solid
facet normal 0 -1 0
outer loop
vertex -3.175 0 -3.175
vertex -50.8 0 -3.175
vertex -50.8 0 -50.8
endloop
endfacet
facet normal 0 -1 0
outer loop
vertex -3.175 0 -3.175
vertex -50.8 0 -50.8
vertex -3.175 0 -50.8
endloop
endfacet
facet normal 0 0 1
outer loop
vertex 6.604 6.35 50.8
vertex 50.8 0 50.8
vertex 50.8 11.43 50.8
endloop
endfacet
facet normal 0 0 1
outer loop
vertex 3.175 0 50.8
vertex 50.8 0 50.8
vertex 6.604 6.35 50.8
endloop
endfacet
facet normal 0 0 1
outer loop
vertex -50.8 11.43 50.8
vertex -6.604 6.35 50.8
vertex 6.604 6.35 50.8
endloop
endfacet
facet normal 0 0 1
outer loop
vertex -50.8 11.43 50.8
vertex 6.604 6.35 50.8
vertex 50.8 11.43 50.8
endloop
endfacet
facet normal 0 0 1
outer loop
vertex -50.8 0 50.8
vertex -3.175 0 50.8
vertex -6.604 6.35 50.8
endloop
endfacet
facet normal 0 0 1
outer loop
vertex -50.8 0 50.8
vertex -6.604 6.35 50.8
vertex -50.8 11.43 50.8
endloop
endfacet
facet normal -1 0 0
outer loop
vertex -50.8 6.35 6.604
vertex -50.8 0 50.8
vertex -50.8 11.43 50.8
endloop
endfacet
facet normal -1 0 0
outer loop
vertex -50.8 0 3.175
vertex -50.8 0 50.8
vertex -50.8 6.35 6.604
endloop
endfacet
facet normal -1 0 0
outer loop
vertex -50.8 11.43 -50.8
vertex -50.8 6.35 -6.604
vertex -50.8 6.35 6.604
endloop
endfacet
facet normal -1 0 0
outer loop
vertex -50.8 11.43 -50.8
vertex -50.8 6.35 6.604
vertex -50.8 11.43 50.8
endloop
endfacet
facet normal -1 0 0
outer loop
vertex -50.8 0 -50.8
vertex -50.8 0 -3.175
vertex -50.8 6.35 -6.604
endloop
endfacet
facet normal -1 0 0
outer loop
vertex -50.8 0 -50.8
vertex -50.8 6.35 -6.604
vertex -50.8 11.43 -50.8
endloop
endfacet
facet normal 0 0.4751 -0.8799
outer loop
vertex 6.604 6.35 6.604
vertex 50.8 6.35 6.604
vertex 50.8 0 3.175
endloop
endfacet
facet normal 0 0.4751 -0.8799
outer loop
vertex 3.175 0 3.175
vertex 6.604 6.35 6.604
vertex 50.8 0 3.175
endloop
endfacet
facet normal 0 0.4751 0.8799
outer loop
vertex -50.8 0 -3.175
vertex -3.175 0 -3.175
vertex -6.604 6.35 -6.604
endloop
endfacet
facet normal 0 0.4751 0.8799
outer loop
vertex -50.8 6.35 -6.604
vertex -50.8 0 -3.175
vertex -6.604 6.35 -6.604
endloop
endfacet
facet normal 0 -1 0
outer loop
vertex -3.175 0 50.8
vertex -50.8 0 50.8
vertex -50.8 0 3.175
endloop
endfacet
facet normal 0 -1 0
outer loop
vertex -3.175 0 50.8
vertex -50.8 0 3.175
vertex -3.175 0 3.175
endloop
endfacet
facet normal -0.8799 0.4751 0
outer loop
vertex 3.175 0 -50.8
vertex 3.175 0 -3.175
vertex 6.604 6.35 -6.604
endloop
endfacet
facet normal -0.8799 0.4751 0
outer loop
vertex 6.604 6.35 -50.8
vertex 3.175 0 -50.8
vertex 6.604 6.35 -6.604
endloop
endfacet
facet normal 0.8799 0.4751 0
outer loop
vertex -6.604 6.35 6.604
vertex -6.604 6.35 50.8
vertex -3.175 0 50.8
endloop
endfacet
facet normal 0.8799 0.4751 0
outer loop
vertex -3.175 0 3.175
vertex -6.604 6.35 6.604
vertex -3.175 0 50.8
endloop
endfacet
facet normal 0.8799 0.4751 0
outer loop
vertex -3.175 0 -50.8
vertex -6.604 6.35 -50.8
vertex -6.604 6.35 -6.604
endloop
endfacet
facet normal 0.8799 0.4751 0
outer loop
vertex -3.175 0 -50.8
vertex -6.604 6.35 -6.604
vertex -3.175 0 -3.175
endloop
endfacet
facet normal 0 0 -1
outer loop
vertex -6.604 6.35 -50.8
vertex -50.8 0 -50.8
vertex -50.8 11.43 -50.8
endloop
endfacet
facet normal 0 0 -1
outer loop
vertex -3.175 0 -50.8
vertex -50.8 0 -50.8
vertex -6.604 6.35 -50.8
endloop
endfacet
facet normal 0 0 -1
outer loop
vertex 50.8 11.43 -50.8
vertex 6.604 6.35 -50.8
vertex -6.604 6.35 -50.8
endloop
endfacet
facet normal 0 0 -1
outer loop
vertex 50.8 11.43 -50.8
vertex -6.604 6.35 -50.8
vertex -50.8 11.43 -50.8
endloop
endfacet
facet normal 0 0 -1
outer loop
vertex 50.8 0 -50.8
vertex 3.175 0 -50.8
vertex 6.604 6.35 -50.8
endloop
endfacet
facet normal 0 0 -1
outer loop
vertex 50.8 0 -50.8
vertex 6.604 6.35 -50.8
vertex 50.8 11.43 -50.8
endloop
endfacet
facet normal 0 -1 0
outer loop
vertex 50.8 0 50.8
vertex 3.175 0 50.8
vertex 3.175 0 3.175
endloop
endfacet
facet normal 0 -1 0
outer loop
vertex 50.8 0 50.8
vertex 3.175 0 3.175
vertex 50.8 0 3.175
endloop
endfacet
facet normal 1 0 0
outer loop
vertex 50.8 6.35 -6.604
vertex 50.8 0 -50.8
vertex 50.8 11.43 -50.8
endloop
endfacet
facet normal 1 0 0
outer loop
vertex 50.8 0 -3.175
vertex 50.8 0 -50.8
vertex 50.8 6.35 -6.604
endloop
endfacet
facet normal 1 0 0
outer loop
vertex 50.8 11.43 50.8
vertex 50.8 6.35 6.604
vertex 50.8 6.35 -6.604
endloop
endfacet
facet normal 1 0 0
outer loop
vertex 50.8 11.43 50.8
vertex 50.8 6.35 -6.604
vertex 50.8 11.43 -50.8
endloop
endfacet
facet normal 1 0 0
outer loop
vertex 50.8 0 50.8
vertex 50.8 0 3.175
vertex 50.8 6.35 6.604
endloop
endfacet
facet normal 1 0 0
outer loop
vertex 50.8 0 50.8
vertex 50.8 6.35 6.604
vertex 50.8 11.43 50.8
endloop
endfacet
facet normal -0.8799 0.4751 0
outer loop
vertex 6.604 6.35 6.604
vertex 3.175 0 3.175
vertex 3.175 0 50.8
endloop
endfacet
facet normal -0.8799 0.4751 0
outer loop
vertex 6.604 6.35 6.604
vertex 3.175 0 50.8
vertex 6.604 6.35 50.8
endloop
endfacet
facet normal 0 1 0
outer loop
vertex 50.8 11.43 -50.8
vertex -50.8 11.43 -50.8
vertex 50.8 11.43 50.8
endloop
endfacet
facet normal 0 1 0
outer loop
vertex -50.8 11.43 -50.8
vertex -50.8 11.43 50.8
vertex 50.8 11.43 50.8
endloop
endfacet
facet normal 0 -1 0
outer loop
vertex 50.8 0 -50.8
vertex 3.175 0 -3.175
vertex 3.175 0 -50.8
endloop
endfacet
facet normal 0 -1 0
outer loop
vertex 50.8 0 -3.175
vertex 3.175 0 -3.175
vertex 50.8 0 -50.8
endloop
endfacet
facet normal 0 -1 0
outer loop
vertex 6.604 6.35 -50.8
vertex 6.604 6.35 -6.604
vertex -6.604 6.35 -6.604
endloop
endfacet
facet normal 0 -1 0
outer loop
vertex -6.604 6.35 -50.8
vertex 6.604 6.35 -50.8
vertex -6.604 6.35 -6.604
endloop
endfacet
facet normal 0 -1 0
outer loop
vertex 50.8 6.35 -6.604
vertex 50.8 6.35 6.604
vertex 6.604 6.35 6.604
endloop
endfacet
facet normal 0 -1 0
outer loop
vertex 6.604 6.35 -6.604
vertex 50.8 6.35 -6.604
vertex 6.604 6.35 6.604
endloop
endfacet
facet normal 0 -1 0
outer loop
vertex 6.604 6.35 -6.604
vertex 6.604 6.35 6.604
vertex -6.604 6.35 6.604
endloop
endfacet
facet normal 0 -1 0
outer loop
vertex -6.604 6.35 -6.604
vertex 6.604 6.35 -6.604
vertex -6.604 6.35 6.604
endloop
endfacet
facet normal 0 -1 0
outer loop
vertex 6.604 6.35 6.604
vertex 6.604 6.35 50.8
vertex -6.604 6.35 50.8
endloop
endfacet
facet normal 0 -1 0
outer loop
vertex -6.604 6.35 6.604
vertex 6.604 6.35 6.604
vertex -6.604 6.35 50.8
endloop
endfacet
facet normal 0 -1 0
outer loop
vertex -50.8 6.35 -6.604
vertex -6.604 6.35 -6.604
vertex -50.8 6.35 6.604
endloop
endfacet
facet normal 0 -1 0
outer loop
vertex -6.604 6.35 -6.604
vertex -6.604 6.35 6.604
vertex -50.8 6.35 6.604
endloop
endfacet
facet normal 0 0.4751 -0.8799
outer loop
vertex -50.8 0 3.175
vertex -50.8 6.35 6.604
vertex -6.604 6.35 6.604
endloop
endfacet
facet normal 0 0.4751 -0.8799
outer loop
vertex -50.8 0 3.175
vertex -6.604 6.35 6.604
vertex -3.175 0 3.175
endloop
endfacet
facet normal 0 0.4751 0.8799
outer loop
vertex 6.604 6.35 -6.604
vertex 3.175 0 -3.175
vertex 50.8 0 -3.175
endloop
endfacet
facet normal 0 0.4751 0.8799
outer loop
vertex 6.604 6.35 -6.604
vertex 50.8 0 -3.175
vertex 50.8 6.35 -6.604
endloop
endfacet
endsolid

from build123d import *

# Parameters (mm, degrees)
F0_W     = 6.35
F0_H     = 6.35
F3_DEPTH = 11.43
F4_DEPTH = 50.8
F5_DEPTH = 50.8


with BuildPart() as f3:
    # F0 (on Front) → F3 (new body)
    with BuildSketch(Plane.XZ):
        with BuildLine():
            ThreePointArc((50.700684167, 3.175), (50.7751649711, 1.5882764743), (50.8, 0))
            Line((50.8, 0), (50.8, 3.175))
            Line((50.8, 3.175), (50.700684167, 3.175))
        make_face()
        with BuildLine():
            ThreePointArc((-1.86e-08, 50.8), (1.588276465, 50.7751649714), (3.175, 50.700684167))
            Line((3.175, 50.700684167), (3.175, 50.8))
            Line((3.175, 50.8), (-1.86e-08, 50.8))
        make_face()
        with BuildLine():
            ThreePointArc((-3.175, 50.700684167), (-1.5882764835, 50.7751649708), (-1.86e-08, 50.8))
            Line((-1.86e-08, 50.8), (-3.175, 50.8))
            Line((-3.175, 50.8), (-3.175, 50.700684167))
        make_face()
        with BuildLine():
            ThreePointArc((-50.8, -4.94e-08), (-50.7751649719, 1.5882764495), (-50.700684167, 3.175))
            Line((-50.700684167, 3.175), (-50.8, 3.175))
            Line((-50.8, 3.175), (-50.8, -4.94e-08))
        make_face()
        with BuildLine():
            Line((-50.8, -3.175), (-50.700684167, -3.175))
            ThreePointArc((-50.700684167, -3.175), (-50.7751649703, -1.588276499), (-50.8, -4.94e-08))
            Line((-50.8, -4.94e-08), (-50.8, -3.175))
        make_face()
        with BuildLine():
            Line((-3.175, -50.8), (-5.98e-08, -50.8))
            ThreePointArc((-5.98e-08, -50.8), (-1.5882765041, -50.7751649702), (-3.175, -50.700684167))
            Line((-3.175, -50.700684167), (-3.175, -50.8))
        make_face()
        with BuildLine():
            Line((3.175, -50.8), (3.175, -50.700684167))
            ThreePointArc((3.175, -50.700684167), (1.5882764444, -50.775164972), (-5.98e-08, -50.8))
            Line((-5.98e-08, -50.8), (3.175, -50.8))
        make_face()
        with BuildLine():
            Line((50.8, -3.175), (50.8, 0))
            ThreePointArc((50.8, 0), (50.7751649711, -1.5882764743), (50.700684167, -3.175))
            Line((50.700684167, -3.175), (50.8, -3.175))
        make_face()
        with BuildLine():
            ThreePointArc((3.175, 50.700684167), (35.9210244843, 35.9210244843), (50.700684167, 3.175))
            Line((50.700684167, 3.175), (50.8, 3.175))
            Line((50.8, 3.175), (50.8, 50.8))
            Line((50.8, 50.8), (3.175, 50.8))
            Line((3.175, 50.8), (3.175, 50.700684167))
        make_face()
        with BuildLine():
            ThreePointArc((-50.700684167, 3.175), (-35.9210244843, 35.9210244843), (-3.175, 50.700684167))
            Line((-3.175, 50.700684167), (-3.175, 50.8))
            Line((-3.175, 50.8), (-50.8, 50.8))
            Line((-50.8, 50.8), (-50.8, 3.175))
            Line((-50.8, 3.175), (-50.700684167, 3.175))
        make_face()
        with BuildLine():
            Line((-3.175, -50.8), (-3.175, -50.700684167))
            ThreePointArc((-3.175, -50.700684167), (-35.9210244843, -35.9210244843), (-50.700684167, -3.175))
            Line((-50.700684167, -3.175), (-50.8, -3.175))
            Line((-50.8, -3.175), (-50.8, -50.8))
            Line((-50.8, -50.8), (-3.175, -50.8))
        make_face()
        with BuildLine():
            Line((50.8, -3.175), (50.700684167, -3.175))
            ThreePointArc((50.700684167, -3.175), (35.9210244843, -35.9210244843), (3.175, -50.700684167))
            Line((3.175, -50.700684167), (3.175, -50.8))
            Line((3.175, -50.8), (50.8, -50.8))
            Line((50.8, -50.8), (50.8, -3.175))
        make_face()
        with BuildLine():
            ThreePointArc((50.700684167, -3.175), (50.7751649711, -1.5882764743), (50.8, 0))
            ThreePointArc((50.8, 0), (50.7751649711, 1.5882764743), (50.700684167, 3.175))
            Line((50.700684167, 3.175), (3.175, 3.175))
            Line((3.175, 3.175), (3.175, -3.175))
            Line((3.175, -3.175), (50.700684167, -3.175))
        make_face()
        with BuildLine():
            Line((3.175, 3.175), (3.175, 50.700684167))
            ThreePointArc((3.175, 50.700684167), (1.588276465, 50.7751649714), (-1.86e-08, 50.8))
            ThreePointArc((-1.86e-08, 50.8), (-1.5882764835, 50.7751649708), (-3.175, 50.700684167))
            Line((-3.175, 50.700684167), (-3.175, 3.175))
            Line((-3.175, 3.175), (3.175, 3.175))
        make_face()
        with BuildLine():
            Line((-3.175, -3.175), (-3.175, 3.175))
            Line((-3.175, 3.175), (-50.700684167, 3.175))
            ThreePointArc((-50.700684167, 3.175), (-50.7751649719, 1.5882764495), (-50.8, -4.94e-08))
            ThreePointArc((-50.8, -4.94e-08), (-50.7751649703, -1.588276499), (-50.700684167, -3.175))
            Line((-50.700684167, -3.175), (-3.175, -3.175))
        make_face()
        with BuildLine():
            ThreePointArc((-5.98e-08, -50.8), (1.5882764444, -50.775164972), (3.175, -50.700684167))
            Line((3.175, -50.700684167), (3.175, -3.175))
            Line((3.175, -3.175), (-3.175, -3.175))
            Line((-3.175, -3.175), (-3.175, -50.700684167))
            ThreePointArc((-3.175, -50.700684167), (-1.5882765041, -50.7751649702), (-5.98e-08, -50.8))
        make_face()
        with BuildLine():
            Line((3.175, 3.175), (50.700684167, 3.175))
            ThreePointArc((50.700684167, 3.175), (35.9210244843, 35.9210244843), (3.175, 50.700684167))
            Line((3.175, 50.700684167), (3.175, 3.175))
        make_face()
        with BuildLine():
            Line((-50.700684167, 3.175), (-3.175, 3.175))
            Line((-3.175, 3.175), (-3.175, 50.700684167))
            ThreePointArc((-3.175, 50.700684167), (-35.9210244843, 35.9210244843), (-50.700684167, 3.175))
        make_face()
        with BuildLine():
            ThreePointArc((3.175, -50.700684167), (35.9210244843, -35.9210244843), (50.700684167, -3.175))
            Line((50.700684167, -3.175), (3.175, -3.175))
            Line((3.175, -3.175), (3.175, -50.700684167))
        make_face()
        with BuildLine():
            Line((-3.175, -50.700684167), (-3.175, -3.175))
            Line((-3.175, -3.175), (-50.700684167, -3.175))
            ThreePointArc((-50.700684167, -3.175), (-35.9210244843, -35.9210244843), (-3.175, -50.700684167))
        make_face()
        Rectangle(F0_W, F0_H)
    extrude(amount=-F3_DEPTH)

    # F1 (on Right) → F4 (cut, symmetric)
    with BuildSketch(Plane.YZ):
        Polygon((6.35, 6.604), (0, 3.175), (0, -3.175), (6.35, -6.604), (6.35, 0), align=None)
    extrude(amount=F4_DEPTH, both=True, mode=Mode.SUBTRACT)

    # F2 (on Top) → F5 (cut, symmetric)
    with BuildSketch(Plane.XY):
        Polygon((-6.604, 6.35), (-3.175, 0), (3.175, 0), (6.604, 6.35), (0, 6.35), align=None)
    extrude(amount=F5_DEPTH, both=True, mode=Mode.SUBTRACT)


solid = f3.part
